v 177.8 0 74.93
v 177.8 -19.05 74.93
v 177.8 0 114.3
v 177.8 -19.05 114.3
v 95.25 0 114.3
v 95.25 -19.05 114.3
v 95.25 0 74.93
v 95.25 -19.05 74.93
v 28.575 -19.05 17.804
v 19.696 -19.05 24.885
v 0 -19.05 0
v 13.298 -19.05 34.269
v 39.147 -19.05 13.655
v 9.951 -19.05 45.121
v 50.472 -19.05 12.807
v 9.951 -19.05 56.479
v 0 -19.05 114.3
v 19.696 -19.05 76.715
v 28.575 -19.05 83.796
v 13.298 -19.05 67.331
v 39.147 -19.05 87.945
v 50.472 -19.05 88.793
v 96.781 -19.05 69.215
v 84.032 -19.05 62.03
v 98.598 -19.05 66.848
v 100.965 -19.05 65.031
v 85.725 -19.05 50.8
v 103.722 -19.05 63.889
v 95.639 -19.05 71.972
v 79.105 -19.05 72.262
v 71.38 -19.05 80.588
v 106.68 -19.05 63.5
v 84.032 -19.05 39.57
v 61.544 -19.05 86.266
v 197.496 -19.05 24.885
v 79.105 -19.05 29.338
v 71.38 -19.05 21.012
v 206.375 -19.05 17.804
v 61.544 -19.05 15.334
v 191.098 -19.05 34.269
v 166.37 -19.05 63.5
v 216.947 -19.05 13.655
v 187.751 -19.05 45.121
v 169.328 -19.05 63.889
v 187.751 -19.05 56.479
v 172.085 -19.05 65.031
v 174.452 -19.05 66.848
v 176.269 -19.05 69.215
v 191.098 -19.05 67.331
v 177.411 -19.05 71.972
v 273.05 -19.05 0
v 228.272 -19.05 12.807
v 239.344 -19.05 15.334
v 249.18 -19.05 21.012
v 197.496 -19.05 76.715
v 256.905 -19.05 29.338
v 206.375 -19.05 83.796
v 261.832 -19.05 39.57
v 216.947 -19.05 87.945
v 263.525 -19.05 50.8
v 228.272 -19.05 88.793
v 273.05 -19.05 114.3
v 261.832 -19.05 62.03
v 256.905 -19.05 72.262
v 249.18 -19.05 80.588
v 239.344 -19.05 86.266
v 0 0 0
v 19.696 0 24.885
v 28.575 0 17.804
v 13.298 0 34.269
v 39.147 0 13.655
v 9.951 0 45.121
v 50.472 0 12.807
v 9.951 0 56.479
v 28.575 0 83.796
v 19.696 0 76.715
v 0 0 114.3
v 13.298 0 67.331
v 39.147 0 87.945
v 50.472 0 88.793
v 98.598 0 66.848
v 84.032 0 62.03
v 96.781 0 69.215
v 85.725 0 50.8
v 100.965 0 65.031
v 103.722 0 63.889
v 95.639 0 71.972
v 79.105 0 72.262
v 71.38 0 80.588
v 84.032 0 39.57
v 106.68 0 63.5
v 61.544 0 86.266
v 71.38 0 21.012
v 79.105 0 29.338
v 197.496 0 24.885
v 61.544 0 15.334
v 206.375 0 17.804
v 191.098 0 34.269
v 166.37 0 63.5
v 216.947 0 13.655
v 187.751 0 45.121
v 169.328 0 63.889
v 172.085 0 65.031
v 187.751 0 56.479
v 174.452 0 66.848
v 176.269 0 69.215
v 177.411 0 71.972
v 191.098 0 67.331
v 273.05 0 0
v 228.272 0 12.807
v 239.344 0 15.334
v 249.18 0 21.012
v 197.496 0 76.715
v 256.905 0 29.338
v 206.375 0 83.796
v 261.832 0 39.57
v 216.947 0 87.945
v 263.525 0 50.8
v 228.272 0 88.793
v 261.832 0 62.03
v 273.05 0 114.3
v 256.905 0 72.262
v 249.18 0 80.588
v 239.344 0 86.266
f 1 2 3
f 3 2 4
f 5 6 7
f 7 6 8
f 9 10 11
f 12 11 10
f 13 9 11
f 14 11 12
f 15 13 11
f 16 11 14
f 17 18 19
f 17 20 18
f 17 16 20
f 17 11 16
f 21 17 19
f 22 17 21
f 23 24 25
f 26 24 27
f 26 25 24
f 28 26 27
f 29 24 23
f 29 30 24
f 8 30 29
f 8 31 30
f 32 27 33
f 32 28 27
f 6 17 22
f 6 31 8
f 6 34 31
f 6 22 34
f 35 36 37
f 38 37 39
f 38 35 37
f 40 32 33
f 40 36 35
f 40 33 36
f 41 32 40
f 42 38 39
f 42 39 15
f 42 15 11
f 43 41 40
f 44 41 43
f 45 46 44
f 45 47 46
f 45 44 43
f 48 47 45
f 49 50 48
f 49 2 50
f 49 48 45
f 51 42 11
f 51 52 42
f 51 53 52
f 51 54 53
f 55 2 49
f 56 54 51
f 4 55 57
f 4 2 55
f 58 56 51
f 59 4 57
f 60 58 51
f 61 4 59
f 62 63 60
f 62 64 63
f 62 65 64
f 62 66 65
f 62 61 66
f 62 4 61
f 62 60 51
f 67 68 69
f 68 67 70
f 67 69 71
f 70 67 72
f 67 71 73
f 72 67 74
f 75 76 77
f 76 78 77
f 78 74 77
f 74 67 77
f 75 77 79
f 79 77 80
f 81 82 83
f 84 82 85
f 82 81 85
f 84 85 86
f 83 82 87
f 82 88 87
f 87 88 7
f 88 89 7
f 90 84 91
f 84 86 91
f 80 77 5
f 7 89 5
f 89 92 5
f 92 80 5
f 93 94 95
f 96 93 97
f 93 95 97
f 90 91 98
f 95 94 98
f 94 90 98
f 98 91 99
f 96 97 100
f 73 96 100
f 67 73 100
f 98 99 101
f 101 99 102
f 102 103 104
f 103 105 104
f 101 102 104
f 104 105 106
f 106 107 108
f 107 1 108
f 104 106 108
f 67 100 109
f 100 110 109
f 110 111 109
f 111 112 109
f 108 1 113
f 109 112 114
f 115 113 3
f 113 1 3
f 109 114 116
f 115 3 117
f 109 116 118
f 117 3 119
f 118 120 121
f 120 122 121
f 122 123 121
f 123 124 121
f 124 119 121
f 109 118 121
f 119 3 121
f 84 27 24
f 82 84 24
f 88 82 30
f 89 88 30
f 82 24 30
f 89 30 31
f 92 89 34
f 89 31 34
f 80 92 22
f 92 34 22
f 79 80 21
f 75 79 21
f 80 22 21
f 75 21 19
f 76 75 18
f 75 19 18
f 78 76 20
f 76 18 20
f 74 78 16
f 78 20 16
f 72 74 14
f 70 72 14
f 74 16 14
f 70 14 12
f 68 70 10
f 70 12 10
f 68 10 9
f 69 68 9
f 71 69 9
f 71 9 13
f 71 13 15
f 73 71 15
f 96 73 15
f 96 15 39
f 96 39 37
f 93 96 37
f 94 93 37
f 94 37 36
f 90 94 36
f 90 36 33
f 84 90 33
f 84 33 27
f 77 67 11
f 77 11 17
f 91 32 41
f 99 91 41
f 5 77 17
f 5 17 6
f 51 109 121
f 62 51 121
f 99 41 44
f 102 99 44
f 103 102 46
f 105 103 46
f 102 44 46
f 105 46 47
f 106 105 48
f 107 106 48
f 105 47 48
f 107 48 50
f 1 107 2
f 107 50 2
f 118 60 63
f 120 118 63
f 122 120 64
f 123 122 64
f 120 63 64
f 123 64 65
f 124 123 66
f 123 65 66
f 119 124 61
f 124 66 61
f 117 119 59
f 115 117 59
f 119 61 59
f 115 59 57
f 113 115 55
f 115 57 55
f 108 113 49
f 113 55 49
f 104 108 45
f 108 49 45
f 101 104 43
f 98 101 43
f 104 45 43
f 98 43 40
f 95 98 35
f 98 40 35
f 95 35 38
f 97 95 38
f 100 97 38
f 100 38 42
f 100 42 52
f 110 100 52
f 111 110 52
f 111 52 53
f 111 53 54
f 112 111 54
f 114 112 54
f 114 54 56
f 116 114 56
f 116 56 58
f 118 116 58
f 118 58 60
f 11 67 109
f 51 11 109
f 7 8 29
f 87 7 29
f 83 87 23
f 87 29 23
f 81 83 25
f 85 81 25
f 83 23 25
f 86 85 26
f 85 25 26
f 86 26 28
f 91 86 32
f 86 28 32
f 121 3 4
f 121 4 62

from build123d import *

# Parameters (mm, degrees)
F0_W     = 273.05
F0_H     = 114.3
F1_DEPTH = 19.05
F2_R     = 38.1
F3_DEPTH = 25.4
F5_DEPTH = 25.4


with BuildPart() as f1:
    # F0 (on Front) → F1 (new body)
    with BuildSketch(Plane.XZ):
        with Locations((136.525, 57.15)):
            Rectangle(F0_W, F0_H)
    extrude(amount=F1_DEPTH)

    # F2 (on face) → F3 (cut)
    with BuildSketch(Plane.XZ.offset(19.05)):
        with Locations((47.625, 50.8)):
            Circle(F2_R)
        with Locations((225.425, 50.8)):
            Circle(F2_R)
    extrude(amount=-F3_DEPTH, mode=Mode.SUBTRACT)

    # F4 (on face) → F5 (cut)
    with BuildSketch(Plane.XZ.offset(19.05)):
        with BuildLine():
            Line((177.8, 114.3), (95.25, 114.3))
            Line((95.25, 114.3), (95.25, 74.93))
            ThreePointArc((95.25, 74.93), (98.597769, 66.847769), (106.68, 63.5))
            Line((106.68, 63.5), (166.37, 63.5))
            ThreePointArc((166.37, 63.5), (174.452231, 66.847769), (177.8, 74.93))
            Line((177.8, 74.93), (177.8, 114.3))
        make_face()
    extrude(amount=-F5_DEPTH, mode=Mode.SUBTRACT)


solid = f1.part
